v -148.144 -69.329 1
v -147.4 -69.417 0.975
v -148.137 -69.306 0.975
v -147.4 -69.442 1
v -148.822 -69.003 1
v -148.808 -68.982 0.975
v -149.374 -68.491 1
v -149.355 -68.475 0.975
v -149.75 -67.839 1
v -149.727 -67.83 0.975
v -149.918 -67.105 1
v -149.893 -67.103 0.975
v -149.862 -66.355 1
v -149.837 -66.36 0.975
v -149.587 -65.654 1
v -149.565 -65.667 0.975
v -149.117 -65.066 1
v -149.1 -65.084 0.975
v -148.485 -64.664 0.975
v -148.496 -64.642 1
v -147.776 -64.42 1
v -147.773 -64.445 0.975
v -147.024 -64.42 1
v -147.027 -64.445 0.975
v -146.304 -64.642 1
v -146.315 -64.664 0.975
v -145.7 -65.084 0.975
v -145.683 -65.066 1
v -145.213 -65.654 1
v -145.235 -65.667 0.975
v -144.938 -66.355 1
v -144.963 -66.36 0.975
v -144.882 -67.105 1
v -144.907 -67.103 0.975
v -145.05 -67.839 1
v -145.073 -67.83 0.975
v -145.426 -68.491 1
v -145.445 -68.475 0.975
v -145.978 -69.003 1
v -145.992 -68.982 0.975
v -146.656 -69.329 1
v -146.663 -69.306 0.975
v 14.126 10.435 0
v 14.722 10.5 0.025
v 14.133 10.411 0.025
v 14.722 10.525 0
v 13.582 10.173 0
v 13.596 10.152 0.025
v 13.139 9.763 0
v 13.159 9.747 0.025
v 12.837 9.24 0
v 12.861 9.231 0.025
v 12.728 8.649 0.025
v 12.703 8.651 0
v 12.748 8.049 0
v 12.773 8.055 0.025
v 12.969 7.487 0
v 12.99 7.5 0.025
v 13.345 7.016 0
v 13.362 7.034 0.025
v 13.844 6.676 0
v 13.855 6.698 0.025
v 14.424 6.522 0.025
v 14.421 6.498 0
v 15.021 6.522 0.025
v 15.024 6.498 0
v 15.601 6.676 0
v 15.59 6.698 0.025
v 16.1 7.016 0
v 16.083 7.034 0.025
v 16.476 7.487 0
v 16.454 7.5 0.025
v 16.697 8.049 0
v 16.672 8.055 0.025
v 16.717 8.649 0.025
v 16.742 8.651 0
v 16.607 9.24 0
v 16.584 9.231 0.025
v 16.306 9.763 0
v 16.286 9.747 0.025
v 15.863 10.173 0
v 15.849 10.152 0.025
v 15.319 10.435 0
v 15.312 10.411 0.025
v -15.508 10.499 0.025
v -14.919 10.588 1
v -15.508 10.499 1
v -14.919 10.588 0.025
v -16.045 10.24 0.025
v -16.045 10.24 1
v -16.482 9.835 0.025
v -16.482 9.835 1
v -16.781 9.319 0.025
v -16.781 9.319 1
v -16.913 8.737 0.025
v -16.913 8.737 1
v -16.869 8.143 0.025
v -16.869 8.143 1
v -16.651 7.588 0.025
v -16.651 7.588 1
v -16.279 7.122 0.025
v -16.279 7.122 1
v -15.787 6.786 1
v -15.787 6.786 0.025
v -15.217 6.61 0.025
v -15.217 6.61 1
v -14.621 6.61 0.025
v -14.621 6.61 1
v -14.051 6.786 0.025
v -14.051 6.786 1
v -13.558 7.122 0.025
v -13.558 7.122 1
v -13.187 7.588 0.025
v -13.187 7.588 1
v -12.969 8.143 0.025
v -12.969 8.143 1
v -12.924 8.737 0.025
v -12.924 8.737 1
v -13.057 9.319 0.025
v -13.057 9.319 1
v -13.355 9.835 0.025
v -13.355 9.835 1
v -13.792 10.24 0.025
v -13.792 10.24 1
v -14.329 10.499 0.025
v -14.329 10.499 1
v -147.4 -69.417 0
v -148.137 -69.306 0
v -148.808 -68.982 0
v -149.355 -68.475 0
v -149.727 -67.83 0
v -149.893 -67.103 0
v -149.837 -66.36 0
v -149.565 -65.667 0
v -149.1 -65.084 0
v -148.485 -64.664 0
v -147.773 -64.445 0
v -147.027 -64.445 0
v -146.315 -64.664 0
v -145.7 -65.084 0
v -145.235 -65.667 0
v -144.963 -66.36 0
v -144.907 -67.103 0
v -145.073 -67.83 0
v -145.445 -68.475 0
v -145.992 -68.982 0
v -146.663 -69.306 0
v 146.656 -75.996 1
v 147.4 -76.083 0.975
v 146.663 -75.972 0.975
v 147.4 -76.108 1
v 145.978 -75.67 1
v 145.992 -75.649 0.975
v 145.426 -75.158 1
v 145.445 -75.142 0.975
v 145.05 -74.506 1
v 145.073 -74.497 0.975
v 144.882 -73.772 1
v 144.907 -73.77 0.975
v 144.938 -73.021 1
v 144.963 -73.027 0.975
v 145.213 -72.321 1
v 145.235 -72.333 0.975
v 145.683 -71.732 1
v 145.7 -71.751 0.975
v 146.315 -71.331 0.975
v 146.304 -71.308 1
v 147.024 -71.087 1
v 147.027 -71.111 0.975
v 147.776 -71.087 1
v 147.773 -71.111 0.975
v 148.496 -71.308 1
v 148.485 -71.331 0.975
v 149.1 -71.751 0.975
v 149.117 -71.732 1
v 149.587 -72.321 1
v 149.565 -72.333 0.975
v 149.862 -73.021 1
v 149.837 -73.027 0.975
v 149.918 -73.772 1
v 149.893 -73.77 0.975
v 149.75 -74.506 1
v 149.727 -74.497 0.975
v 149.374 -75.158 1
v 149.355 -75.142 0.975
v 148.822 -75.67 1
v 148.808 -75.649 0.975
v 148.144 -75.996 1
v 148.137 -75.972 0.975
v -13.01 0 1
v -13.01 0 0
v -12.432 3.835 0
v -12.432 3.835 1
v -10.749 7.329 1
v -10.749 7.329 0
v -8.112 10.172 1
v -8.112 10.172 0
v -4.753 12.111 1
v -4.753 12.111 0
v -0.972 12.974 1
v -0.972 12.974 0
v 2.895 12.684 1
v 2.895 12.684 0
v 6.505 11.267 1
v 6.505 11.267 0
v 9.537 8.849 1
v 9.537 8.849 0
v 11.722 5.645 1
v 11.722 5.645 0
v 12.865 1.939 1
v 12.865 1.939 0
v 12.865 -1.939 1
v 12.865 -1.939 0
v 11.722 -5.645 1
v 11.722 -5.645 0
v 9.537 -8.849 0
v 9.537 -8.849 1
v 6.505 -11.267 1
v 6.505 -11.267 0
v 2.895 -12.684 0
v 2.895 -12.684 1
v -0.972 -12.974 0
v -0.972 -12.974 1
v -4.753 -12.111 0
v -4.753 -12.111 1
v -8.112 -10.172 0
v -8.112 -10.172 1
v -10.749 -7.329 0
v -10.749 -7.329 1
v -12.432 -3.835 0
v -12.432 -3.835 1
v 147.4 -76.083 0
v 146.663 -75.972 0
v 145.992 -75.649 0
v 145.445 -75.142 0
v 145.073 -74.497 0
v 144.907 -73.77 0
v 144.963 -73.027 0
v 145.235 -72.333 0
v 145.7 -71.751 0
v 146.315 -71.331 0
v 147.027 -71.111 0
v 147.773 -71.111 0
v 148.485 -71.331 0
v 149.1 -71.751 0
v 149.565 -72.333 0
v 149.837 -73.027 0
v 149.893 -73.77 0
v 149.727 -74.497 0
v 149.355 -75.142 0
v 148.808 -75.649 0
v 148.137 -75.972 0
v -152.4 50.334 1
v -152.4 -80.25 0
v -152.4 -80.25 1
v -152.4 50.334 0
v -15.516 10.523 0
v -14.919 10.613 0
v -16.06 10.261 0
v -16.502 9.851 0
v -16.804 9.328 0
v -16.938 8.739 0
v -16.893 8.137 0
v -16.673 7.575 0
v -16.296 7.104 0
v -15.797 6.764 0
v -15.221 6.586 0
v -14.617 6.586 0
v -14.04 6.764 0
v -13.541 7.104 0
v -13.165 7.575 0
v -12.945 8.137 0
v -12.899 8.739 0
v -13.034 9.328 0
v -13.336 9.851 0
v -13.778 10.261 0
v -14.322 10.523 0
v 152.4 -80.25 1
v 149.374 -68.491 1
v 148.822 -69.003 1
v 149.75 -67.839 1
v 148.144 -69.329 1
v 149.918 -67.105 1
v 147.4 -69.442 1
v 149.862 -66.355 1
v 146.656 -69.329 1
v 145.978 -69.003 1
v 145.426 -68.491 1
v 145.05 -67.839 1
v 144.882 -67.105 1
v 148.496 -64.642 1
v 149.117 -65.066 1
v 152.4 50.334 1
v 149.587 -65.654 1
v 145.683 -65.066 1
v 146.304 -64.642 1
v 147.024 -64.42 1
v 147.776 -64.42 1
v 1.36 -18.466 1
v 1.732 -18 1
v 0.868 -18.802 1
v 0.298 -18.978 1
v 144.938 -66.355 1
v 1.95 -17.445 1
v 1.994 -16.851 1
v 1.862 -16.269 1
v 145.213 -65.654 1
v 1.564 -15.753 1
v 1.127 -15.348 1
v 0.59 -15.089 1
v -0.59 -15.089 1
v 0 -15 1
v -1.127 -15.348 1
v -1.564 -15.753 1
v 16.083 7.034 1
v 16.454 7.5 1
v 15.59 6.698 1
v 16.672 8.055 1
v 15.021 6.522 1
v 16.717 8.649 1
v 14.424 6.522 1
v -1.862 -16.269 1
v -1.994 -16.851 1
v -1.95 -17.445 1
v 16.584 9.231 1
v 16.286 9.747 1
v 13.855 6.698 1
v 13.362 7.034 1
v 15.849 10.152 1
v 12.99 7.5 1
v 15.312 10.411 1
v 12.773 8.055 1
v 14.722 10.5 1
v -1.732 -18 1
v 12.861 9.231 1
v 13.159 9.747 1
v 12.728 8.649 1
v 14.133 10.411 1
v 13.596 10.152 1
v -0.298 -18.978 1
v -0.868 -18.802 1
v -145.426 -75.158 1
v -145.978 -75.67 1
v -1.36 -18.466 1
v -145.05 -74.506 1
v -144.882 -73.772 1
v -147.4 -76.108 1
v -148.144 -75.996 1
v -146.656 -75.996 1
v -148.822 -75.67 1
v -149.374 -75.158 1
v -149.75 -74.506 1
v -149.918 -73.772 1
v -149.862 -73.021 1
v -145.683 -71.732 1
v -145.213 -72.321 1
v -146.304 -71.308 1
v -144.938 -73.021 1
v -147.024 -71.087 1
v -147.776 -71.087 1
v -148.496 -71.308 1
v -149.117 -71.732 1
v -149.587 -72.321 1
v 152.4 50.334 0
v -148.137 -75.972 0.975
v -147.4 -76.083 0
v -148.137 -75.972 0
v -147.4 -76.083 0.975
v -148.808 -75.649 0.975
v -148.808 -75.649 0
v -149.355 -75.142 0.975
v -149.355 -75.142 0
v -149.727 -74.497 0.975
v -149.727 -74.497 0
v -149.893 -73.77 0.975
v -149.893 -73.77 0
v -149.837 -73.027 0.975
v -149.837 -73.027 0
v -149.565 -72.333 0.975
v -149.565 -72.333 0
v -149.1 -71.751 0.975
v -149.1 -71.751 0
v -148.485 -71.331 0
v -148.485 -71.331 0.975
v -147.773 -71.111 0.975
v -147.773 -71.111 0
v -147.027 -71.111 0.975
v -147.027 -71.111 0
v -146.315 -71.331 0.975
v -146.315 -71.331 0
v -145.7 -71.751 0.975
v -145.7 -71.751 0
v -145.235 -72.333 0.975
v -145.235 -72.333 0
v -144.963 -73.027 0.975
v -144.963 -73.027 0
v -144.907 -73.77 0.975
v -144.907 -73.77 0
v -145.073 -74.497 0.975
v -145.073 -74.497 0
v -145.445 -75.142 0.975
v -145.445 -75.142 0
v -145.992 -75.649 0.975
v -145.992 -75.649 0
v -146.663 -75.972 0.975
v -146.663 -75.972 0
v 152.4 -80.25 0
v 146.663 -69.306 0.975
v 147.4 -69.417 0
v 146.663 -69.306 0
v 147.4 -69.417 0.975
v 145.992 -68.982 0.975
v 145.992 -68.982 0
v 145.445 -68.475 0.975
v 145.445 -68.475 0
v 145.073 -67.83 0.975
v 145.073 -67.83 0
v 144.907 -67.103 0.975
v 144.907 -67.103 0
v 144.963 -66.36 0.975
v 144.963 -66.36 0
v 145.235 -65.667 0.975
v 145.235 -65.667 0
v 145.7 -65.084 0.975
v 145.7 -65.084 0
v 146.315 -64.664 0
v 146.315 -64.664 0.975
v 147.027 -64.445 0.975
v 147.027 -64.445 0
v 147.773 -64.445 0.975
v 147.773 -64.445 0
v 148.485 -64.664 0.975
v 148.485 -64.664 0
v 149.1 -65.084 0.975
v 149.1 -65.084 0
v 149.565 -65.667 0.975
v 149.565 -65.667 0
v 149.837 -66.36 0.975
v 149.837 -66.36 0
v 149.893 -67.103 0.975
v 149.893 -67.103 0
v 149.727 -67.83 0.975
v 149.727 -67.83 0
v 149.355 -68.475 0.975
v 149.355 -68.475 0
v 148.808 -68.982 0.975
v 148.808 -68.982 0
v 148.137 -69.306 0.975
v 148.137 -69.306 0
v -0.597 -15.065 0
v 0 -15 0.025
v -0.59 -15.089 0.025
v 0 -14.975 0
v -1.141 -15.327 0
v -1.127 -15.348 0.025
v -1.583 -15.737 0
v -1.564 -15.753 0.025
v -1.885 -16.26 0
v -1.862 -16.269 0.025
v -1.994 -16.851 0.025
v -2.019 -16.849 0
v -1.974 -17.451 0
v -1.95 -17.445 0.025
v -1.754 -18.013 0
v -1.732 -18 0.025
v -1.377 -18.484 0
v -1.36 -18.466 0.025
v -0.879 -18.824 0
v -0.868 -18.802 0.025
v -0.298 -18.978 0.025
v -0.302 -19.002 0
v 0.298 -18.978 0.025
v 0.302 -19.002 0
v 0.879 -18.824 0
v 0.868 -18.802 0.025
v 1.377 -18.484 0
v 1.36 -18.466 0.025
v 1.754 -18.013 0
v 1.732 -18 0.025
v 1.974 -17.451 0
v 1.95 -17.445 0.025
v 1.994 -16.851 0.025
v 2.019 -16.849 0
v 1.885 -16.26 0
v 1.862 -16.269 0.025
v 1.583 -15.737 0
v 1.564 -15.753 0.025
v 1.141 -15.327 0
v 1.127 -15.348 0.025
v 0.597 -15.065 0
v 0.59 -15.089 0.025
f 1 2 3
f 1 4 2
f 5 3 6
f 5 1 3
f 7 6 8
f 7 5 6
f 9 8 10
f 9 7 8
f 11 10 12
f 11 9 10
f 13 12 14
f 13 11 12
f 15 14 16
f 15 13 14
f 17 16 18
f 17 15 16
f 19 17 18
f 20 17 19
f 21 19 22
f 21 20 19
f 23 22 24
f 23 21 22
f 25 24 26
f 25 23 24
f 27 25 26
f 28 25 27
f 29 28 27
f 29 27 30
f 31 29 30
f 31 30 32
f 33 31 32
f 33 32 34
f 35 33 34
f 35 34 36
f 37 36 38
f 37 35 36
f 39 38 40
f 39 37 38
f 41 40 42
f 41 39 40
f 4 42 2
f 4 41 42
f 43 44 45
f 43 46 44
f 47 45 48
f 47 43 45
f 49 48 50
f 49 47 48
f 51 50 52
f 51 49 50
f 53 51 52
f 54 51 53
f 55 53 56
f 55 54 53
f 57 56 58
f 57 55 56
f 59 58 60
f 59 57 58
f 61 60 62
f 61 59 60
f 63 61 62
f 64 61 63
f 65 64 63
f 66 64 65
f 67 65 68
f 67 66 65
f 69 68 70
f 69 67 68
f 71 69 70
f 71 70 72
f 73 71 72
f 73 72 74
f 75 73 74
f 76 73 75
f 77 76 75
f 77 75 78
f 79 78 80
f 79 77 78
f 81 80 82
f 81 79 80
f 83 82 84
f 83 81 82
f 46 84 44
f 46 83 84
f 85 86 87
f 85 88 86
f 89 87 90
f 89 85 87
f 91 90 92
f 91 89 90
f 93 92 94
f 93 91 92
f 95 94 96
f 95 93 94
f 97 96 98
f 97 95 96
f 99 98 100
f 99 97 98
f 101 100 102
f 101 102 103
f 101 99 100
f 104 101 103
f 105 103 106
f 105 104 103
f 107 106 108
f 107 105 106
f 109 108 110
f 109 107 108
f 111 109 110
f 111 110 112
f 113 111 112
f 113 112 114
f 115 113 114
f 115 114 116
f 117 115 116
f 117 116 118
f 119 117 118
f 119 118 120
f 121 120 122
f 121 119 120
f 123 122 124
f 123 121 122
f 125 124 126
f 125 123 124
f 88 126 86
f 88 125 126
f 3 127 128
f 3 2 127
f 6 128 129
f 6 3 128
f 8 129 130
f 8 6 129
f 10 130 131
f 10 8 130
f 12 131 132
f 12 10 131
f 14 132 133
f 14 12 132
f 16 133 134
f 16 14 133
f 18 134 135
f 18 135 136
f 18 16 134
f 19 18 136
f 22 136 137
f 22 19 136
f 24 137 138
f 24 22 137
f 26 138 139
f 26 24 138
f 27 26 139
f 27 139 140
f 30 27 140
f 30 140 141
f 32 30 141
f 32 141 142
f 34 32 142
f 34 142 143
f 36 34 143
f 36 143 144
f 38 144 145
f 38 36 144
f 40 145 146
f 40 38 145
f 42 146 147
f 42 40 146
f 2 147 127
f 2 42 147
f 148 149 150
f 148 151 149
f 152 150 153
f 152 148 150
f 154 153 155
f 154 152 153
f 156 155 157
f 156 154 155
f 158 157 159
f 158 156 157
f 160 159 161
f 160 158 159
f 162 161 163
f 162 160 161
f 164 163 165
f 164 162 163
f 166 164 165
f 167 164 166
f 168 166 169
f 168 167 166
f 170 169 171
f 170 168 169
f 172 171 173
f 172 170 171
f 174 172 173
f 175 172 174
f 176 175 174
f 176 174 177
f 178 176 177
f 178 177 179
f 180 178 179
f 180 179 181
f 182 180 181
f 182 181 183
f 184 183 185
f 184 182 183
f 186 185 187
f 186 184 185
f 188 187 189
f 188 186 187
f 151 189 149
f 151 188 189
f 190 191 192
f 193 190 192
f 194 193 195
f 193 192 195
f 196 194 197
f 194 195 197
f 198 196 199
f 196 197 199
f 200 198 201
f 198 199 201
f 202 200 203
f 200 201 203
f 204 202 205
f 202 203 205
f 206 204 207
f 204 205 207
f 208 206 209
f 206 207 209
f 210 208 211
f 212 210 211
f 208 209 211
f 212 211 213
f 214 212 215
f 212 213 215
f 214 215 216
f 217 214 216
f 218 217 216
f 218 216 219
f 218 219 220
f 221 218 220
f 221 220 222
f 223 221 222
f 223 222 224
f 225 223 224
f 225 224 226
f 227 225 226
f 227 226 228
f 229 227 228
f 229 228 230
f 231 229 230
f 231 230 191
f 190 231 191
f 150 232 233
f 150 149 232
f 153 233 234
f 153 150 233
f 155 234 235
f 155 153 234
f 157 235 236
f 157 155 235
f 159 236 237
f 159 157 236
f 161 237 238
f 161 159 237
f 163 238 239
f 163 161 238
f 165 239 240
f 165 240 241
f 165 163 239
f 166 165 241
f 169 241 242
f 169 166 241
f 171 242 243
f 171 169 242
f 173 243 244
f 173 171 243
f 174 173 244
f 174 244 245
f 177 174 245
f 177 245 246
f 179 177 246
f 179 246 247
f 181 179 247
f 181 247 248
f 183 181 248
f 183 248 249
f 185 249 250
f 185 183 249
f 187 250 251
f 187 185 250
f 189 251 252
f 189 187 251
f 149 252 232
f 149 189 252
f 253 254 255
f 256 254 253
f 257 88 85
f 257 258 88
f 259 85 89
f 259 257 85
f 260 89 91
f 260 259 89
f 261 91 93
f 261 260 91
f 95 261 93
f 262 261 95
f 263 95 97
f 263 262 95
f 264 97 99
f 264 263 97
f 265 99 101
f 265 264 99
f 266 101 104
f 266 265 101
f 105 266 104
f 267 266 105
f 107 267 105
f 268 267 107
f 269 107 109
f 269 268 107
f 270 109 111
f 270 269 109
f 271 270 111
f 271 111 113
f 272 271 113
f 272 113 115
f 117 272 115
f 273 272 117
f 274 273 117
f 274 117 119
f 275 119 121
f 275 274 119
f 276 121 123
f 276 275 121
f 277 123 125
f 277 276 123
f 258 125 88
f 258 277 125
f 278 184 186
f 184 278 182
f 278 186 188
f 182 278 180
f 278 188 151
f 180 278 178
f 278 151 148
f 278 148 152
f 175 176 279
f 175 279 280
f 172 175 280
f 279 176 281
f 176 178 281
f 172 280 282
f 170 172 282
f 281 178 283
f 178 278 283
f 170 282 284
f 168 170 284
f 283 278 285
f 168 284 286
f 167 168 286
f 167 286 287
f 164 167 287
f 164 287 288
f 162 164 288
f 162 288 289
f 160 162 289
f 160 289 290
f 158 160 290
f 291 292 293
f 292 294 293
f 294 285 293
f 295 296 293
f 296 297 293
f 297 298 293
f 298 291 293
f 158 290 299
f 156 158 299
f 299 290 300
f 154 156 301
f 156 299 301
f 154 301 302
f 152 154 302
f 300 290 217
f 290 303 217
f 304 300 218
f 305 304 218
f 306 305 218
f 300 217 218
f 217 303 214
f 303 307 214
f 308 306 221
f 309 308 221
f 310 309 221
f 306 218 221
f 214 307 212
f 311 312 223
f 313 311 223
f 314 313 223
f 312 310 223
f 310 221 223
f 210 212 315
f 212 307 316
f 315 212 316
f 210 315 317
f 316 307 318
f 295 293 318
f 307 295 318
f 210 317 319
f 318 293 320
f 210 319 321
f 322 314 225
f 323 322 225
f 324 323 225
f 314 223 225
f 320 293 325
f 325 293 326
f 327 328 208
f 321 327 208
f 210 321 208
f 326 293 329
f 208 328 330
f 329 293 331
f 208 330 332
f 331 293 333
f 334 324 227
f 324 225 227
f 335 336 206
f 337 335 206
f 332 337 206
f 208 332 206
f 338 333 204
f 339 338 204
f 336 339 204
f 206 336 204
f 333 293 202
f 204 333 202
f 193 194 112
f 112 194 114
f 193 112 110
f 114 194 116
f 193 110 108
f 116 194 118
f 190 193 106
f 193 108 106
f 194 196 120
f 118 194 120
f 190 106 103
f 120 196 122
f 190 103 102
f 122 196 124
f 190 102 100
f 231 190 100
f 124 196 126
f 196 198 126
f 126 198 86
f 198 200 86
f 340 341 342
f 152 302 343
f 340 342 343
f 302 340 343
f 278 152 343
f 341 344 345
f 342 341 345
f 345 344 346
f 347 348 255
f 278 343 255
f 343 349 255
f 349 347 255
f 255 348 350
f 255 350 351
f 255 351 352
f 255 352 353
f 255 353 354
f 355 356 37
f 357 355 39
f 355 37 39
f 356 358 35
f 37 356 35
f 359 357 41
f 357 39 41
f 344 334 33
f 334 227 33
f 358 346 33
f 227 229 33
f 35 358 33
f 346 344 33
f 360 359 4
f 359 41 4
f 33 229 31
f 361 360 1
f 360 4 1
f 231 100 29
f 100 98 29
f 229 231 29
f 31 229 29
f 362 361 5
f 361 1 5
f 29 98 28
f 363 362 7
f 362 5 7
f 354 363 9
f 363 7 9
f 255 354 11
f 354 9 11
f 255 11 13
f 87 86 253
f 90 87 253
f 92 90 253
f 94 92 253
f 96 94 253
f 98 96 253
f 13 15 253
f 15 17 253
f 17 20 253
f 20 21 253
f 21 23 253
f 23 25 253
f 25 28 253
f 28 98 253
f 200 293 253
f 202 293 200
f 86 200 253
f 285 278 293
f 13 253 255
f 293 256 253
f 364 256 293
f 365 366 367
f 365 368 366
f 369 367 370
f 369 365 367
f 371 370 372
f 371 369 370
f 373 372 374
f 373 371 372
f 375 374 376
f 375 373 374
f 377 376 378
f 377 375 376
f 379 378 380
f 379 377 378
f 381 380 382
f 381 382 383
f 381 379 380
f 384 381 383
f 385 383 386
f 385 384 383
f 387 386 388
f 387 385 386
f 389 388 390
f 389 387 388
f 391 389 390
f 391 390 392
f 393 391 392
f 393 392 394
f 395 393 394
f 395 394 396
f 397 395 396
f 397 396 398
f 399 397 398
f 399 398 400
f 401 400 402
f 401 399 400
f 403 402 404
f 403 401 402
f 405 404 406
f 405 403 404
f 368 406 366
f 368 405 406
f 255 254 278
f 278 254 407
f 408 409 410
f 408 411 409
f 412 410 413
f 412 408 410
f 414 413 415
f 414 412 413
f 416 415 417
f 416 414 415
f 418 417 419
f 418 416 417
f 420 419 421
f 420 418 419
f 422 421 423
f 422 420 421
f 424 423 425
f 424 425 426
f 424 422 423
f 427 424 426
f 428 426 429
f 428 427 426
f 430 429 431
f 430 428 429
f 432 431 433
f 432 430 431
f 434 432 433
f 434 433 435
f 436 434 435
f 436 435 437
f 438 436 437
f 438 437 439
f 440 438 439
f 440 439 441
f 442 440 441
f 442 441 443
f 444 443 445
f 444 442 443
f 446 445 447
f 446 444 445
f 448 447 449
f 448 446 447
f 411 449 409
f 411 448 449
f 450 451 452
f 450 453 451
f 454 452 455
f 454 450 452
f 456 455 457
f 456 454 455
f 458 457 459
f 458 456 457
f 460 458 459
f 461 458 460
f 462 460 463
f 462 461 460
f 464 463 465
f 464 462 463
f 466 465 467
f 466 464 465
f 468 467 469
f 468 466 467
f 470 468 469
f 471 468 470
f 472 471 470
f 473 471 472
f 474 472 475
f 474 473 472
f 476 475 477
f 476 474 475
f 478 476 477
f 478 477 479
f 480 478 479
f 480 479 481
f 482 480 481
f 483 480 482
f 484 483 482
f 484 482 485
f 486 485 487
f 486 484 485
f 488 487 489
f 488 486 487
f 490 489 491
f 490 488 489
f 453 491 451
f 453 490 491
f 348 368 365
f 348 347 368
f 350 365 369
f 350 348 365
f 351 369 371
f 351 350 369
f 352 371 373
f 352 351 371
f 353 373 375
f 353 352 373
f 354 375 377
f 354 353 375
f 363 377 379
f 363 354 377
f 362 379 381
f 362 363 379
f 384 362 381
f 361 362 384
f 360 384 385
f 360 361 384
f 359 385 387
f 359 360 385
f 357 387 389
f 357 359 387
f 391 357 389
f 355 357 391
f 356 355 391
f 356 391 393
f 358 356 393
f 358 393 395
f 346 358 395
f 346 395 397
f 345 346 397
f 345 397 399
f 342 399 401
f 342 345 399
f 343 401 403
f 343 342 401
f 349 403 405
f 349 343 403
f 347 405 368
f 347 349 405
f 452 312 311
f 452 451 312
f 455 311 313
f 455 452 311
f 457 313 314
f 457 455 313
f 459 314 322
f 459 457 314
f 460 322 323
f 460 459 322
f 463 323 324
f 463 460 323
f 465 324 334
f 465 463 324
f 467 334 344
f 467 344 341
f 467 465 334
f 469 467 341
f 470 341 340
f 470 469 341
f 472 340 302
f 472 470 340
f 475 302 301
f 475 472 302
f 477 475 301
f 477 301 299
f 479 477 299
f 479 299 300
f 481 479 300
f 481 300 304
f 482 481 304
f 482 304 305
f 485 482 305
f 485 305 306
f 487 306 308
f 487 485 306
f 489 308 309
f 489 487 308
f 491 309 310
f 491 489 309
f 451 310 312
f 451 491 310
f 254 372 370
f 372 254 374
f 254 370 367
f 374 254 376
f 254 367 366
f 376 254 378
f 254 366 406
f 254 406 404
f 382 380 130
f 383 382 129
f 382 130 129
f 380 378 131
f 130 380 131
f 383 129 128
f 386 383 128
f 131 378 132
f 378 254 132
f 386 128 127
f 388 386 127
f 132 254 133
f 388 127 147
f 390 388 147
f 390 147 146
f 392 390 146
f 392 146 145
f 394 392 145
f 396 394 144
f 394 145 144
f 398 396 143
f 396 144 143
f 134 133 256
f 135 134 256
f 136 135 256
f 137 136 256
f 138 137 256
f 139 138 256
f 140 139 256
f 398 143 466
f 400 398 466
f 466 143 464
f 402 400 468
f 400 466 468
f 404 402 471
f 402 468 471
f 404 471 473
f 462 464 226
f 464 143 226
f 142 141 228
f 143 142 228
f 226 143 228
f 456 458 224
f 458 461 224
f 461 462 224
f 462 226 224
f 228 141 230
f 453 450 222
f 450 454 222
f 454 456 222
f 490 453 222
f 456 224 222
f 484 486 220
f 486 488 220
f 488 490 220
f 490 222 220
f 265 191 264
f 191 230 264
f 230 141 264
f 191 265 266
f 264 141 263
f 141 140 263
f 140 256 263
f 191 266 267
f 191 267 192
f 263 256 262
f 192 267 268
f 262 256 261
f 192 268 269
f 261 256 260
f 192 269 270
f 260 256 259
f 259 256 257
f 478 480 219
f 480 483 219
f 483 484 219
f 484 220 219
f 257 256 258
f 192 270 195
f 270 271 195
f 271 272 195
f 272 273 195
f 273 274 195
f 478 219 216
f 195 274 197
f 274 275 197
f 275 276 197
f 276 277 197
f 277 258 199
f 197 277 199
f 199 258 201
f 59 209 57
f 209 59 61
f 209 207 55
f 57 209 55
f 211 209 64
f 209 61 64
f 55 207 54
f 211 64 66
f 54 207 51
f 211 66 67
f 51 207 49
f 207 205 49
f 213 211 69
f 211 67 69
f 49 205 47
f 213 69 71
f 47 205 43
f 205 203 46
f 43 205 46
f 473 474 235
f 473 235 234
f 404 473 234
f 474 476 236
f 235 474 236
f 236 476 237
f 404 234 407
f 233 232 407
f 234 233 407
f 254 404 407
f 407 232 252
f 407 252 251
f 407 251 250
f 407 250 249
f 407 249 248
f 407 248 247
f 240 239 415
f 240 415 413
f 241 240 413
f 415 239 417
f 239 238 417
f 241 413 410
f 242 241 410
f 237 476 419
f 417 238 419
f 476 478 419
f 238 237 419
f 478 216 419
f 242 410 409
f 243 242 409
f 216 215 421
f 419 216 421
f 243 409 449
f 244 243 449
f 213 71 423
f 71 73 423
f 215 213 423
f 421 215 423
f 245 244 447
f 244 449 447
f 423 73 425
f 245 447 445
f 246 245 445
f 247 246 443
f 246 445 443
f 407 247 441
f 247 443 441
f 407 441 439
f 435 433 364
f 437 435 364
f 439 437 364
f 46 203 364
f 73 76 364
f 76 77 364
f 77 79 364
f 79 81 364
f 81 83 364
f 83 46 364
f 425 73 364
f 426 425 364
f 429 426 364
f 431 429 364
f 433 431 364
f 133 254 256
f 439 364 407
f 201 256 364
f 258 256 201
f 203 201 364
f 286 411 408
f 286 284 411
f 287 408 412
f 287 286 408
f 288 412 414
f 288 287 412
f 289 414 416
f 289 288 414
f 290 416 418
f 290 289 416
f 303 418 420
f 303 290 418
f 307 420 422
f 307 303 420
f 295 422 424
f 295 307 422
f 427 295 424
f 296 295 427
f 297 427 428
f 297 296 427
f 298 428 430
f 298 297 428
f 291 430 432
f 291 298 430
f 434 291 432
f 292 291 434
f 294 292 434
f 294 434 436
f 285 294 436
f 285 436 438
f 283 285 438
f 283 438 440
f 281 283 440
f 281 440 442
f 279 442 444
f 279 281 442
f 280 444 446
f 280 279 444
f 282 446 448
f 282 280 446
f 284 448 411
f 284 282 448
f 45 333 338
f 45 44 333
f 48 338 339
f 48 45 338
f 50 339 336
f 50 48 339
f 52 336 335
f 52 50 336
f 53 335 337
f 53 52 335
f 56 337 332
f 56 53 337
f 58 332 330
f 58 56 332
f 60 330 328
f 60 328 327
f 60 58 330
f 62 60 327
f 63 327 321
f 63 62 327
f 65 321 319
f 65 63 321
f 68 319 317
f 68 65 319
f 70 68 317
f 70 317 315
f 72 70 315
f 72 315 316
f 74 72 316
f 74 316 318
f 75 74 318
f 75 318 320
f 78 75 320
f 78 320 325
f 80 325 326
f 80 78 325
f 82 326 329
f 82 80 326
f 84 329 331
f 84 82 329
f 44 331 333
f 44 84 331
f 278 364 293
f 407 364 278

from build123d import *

# Parameters (mm, degrees)
BOSS_EXTRUDE2_DEPTH            = 1
F_5_0MM_DOWEL_HOLE4_AT_2_COUNT = 2
F_5_0MM_DOWEL_HOLE4_AT_2_PITCH = 6.666666667
F_5_0MM_DOWEL_HOLE4_AT_3_COUNT = 2
F_5_0MM_DOWEL_HOLE4_AT_3_PITCH = 294.8
F_5_0MM_DOWEL_HOLE4_AT_4_COUNT = 2
F_5_0MM_DOWEL_HOLE4_AT_4_PITCH = 294.875371037
F_4_0MM_DOWEL_HOLE1_AT_2_COUNT = 2
F_4_0MM_DOWEL_HOLE1_AT_2_PITCH = 29.641373273
F_4_0MM_DOWEL_HOLE1_AT_3_COUNT = 2
F_4_0MM_DOWEL_HOLE1_AT_3_PITCH = 29.619508559
SKETCH14_R                     = 13.01
CUT_EXTRUDE1_DEPTH             = 10
BOSS_EXTRUDE4_DEPTH            = 1


with BuildPart() as part:
    # Sketch1 → Boss-Extrude2 (new body)
    with BuildSketch(Plane.XY):
        with BuildLine():
            Line((-152.4, -80.25), (152.4, -80.25))
            Line((152.4, -80.25), (152.4, -60.25))
            ThreePointArc((152.4, -60.25), (0, 50.334231889), (-152.4, -60.25))
            Line((-152.4, -60.25), (-152.4, -80.25))
        make_face()
    extrude(amount=BOSS_EXTRUDE2_DEPTH)

    # Sketch9 → Ø5.0mm Dowel Hole4 (revolve, cut)
    with BuildSketch(Plane(origin=(-147.4, -66.916666667, 1), x_dir=(0, -1, 0), z_dir=(1, 0, 0))):
        Polygon((0, 0), (0, 2.502151548), (2.5, 1), (2.5, 0.025), (2.525, 0), align=None)
    f_5_0mm_dowel_hole4 = revolve(axis=Axis((-147.4, -66.916666667, 7.35), (0, 0, -1)), mode=Mode.SUBTRACT)

    # Ø5.0mm Dowel Hole4 at 2: Ø5.0mm Dowel Hole4 ×2
    with Locations(*[(0, -i * F_5_0MM_DOWEL_HOLE4_AT_2_PITCH, 0) for i in range(1, F_5_0MM_DOWEL_HOLE4_AT_2_COUNT)]):
        add(f_5_0mm_dowel_hole4, mode=Mode.SUBTRACT)

    # Ø5.0mm Dowel Hole4 at 3: Ø5.0mm Dowel Hole4 ×2
    with Locations(*[(i * F_5_0MM_DOWEL_HOLE4_AT_3_PITCH, 0, 0) for i in range(1, F_5_0MM_DOWEL_HOLE4_AT_3_COUNT)]):
        add(f_5_0mm_dowel_hole4, mode=Mode.SUBTRACT)

    # Ø5.0mm Dowel Hole4 at 4: Ø5.0mm Dowel Hole4 ×2
    with Locations(*[Vector(0.9997443969730838, -0.02260842146026871, 0) * (i * F_5_0MM_DOWEL_HOLE4_AT_4_PITCH) for i in range(1, F_5_0MM_DOWEL_HOLE4_AT_4_COUNT)]):
        add(f_5_0mm_dowel_hole4, mode=Mode.SUBTRACT)

    # Sketch13 → Ø4.0mm Dowel Hole1 (revolve, cut)
    with BuildSketch(Plane(origin=(-14.91881086, 8.587973147, 0), x_dir=(0, 1, 0), z_dir=(1, 0, 0))):
        Polygon((0, 0), (0, 1), (2, 1), (2, 0.025), (2.025, 0), align=None)
    f_4_0mm_dowel_hole1 = revolve(axis=Axis((-14.91881086, 8.587973147, -6.35), (0, 0, 1)), mode=Mode.SUBTRACT)

    # Ø4.0mm Dowel Hole1 at 2: Ø4.0mm Dowel Hole1 ×2
    with Locations(*[Vector(0.9999955957234619, -0.0029679173975410726, 0) * (i * F_4_0MM_DOWEL_HOLE1_AT_2_PITCH) for i in range(1, F_4_0MM_DOWEL_HOLE1_AT_2_COUNT)]):
        add(f_4_0mm_dowel_hole1, mode=Mode.SUBTRACT)

    # Ø4.0mm Dowel Hole1 at 3: Ø4.0mm Dowel Hole1 ×2
    with Locations(*[Vector(0.5036819172784638, -0.8638891863003557, 0) * (i * F_4_0MM_DOWEL_HOLE1_AT_3_PITCH) for i in range(1, F_4_0MM_DOWEL_HOLE1_AT_3_COUNT)]):
        add(f_4_0mm_dowel_hole1, mode=Mode.SUBTRACT)

    # Sketch14 → Cut-Extrude1 (cut)
    with BuildSketch(Plane(origin=(0, 0, 0), x_dir=(-1, 0, 0), z_dir=(0, 0, -1))):
        Circle(SKETCH14_R)
    extrude(amount=-CUT_EXTRUDE1_DEPTH, mode=Mode.SUBTRACT)

    # Sketch15 → Boss-Extrude4 (add)
    with BuildSketch(Plane(origin=(0, 0, 0), x_dir=(-1, 0, 0), z_dir=(0, 0, -1))):
        with BuildLine():
            ThreePointArc((-152.4, -60.25), (0, 40.202429788), (152.4, -60.25))
            ThreePointArc((152.4, -60.25), (0, 50.334231889), (-152.4, -60.25))
        make_face()
        with BuildLine():
            Line((-152.4, 50.334231889), (-152.4, -60.25))
            ThreePointArc((-152.4, -60.25), (-94.147002198, 19.775508453), (8.24e-07, 50.334231889))
            Line((8.24e-07, 50.334231889), (-152.4, 50.334231889))
        make_face()
        with BuildLine():
            ThreePointArc((8.24e-07, 50.334231889), (94.147002865, 19.775507969), (152.4, -60.25))
            Line((152.4, -60.25), (152.4, 50.334231889))
            Line((152.4, 50.334231889), (8.24e-07, 50.334231889))
        make_face()
    extrude(amount=-BOSS_EXTRUDE4_DEPTH)


solid = part.part
